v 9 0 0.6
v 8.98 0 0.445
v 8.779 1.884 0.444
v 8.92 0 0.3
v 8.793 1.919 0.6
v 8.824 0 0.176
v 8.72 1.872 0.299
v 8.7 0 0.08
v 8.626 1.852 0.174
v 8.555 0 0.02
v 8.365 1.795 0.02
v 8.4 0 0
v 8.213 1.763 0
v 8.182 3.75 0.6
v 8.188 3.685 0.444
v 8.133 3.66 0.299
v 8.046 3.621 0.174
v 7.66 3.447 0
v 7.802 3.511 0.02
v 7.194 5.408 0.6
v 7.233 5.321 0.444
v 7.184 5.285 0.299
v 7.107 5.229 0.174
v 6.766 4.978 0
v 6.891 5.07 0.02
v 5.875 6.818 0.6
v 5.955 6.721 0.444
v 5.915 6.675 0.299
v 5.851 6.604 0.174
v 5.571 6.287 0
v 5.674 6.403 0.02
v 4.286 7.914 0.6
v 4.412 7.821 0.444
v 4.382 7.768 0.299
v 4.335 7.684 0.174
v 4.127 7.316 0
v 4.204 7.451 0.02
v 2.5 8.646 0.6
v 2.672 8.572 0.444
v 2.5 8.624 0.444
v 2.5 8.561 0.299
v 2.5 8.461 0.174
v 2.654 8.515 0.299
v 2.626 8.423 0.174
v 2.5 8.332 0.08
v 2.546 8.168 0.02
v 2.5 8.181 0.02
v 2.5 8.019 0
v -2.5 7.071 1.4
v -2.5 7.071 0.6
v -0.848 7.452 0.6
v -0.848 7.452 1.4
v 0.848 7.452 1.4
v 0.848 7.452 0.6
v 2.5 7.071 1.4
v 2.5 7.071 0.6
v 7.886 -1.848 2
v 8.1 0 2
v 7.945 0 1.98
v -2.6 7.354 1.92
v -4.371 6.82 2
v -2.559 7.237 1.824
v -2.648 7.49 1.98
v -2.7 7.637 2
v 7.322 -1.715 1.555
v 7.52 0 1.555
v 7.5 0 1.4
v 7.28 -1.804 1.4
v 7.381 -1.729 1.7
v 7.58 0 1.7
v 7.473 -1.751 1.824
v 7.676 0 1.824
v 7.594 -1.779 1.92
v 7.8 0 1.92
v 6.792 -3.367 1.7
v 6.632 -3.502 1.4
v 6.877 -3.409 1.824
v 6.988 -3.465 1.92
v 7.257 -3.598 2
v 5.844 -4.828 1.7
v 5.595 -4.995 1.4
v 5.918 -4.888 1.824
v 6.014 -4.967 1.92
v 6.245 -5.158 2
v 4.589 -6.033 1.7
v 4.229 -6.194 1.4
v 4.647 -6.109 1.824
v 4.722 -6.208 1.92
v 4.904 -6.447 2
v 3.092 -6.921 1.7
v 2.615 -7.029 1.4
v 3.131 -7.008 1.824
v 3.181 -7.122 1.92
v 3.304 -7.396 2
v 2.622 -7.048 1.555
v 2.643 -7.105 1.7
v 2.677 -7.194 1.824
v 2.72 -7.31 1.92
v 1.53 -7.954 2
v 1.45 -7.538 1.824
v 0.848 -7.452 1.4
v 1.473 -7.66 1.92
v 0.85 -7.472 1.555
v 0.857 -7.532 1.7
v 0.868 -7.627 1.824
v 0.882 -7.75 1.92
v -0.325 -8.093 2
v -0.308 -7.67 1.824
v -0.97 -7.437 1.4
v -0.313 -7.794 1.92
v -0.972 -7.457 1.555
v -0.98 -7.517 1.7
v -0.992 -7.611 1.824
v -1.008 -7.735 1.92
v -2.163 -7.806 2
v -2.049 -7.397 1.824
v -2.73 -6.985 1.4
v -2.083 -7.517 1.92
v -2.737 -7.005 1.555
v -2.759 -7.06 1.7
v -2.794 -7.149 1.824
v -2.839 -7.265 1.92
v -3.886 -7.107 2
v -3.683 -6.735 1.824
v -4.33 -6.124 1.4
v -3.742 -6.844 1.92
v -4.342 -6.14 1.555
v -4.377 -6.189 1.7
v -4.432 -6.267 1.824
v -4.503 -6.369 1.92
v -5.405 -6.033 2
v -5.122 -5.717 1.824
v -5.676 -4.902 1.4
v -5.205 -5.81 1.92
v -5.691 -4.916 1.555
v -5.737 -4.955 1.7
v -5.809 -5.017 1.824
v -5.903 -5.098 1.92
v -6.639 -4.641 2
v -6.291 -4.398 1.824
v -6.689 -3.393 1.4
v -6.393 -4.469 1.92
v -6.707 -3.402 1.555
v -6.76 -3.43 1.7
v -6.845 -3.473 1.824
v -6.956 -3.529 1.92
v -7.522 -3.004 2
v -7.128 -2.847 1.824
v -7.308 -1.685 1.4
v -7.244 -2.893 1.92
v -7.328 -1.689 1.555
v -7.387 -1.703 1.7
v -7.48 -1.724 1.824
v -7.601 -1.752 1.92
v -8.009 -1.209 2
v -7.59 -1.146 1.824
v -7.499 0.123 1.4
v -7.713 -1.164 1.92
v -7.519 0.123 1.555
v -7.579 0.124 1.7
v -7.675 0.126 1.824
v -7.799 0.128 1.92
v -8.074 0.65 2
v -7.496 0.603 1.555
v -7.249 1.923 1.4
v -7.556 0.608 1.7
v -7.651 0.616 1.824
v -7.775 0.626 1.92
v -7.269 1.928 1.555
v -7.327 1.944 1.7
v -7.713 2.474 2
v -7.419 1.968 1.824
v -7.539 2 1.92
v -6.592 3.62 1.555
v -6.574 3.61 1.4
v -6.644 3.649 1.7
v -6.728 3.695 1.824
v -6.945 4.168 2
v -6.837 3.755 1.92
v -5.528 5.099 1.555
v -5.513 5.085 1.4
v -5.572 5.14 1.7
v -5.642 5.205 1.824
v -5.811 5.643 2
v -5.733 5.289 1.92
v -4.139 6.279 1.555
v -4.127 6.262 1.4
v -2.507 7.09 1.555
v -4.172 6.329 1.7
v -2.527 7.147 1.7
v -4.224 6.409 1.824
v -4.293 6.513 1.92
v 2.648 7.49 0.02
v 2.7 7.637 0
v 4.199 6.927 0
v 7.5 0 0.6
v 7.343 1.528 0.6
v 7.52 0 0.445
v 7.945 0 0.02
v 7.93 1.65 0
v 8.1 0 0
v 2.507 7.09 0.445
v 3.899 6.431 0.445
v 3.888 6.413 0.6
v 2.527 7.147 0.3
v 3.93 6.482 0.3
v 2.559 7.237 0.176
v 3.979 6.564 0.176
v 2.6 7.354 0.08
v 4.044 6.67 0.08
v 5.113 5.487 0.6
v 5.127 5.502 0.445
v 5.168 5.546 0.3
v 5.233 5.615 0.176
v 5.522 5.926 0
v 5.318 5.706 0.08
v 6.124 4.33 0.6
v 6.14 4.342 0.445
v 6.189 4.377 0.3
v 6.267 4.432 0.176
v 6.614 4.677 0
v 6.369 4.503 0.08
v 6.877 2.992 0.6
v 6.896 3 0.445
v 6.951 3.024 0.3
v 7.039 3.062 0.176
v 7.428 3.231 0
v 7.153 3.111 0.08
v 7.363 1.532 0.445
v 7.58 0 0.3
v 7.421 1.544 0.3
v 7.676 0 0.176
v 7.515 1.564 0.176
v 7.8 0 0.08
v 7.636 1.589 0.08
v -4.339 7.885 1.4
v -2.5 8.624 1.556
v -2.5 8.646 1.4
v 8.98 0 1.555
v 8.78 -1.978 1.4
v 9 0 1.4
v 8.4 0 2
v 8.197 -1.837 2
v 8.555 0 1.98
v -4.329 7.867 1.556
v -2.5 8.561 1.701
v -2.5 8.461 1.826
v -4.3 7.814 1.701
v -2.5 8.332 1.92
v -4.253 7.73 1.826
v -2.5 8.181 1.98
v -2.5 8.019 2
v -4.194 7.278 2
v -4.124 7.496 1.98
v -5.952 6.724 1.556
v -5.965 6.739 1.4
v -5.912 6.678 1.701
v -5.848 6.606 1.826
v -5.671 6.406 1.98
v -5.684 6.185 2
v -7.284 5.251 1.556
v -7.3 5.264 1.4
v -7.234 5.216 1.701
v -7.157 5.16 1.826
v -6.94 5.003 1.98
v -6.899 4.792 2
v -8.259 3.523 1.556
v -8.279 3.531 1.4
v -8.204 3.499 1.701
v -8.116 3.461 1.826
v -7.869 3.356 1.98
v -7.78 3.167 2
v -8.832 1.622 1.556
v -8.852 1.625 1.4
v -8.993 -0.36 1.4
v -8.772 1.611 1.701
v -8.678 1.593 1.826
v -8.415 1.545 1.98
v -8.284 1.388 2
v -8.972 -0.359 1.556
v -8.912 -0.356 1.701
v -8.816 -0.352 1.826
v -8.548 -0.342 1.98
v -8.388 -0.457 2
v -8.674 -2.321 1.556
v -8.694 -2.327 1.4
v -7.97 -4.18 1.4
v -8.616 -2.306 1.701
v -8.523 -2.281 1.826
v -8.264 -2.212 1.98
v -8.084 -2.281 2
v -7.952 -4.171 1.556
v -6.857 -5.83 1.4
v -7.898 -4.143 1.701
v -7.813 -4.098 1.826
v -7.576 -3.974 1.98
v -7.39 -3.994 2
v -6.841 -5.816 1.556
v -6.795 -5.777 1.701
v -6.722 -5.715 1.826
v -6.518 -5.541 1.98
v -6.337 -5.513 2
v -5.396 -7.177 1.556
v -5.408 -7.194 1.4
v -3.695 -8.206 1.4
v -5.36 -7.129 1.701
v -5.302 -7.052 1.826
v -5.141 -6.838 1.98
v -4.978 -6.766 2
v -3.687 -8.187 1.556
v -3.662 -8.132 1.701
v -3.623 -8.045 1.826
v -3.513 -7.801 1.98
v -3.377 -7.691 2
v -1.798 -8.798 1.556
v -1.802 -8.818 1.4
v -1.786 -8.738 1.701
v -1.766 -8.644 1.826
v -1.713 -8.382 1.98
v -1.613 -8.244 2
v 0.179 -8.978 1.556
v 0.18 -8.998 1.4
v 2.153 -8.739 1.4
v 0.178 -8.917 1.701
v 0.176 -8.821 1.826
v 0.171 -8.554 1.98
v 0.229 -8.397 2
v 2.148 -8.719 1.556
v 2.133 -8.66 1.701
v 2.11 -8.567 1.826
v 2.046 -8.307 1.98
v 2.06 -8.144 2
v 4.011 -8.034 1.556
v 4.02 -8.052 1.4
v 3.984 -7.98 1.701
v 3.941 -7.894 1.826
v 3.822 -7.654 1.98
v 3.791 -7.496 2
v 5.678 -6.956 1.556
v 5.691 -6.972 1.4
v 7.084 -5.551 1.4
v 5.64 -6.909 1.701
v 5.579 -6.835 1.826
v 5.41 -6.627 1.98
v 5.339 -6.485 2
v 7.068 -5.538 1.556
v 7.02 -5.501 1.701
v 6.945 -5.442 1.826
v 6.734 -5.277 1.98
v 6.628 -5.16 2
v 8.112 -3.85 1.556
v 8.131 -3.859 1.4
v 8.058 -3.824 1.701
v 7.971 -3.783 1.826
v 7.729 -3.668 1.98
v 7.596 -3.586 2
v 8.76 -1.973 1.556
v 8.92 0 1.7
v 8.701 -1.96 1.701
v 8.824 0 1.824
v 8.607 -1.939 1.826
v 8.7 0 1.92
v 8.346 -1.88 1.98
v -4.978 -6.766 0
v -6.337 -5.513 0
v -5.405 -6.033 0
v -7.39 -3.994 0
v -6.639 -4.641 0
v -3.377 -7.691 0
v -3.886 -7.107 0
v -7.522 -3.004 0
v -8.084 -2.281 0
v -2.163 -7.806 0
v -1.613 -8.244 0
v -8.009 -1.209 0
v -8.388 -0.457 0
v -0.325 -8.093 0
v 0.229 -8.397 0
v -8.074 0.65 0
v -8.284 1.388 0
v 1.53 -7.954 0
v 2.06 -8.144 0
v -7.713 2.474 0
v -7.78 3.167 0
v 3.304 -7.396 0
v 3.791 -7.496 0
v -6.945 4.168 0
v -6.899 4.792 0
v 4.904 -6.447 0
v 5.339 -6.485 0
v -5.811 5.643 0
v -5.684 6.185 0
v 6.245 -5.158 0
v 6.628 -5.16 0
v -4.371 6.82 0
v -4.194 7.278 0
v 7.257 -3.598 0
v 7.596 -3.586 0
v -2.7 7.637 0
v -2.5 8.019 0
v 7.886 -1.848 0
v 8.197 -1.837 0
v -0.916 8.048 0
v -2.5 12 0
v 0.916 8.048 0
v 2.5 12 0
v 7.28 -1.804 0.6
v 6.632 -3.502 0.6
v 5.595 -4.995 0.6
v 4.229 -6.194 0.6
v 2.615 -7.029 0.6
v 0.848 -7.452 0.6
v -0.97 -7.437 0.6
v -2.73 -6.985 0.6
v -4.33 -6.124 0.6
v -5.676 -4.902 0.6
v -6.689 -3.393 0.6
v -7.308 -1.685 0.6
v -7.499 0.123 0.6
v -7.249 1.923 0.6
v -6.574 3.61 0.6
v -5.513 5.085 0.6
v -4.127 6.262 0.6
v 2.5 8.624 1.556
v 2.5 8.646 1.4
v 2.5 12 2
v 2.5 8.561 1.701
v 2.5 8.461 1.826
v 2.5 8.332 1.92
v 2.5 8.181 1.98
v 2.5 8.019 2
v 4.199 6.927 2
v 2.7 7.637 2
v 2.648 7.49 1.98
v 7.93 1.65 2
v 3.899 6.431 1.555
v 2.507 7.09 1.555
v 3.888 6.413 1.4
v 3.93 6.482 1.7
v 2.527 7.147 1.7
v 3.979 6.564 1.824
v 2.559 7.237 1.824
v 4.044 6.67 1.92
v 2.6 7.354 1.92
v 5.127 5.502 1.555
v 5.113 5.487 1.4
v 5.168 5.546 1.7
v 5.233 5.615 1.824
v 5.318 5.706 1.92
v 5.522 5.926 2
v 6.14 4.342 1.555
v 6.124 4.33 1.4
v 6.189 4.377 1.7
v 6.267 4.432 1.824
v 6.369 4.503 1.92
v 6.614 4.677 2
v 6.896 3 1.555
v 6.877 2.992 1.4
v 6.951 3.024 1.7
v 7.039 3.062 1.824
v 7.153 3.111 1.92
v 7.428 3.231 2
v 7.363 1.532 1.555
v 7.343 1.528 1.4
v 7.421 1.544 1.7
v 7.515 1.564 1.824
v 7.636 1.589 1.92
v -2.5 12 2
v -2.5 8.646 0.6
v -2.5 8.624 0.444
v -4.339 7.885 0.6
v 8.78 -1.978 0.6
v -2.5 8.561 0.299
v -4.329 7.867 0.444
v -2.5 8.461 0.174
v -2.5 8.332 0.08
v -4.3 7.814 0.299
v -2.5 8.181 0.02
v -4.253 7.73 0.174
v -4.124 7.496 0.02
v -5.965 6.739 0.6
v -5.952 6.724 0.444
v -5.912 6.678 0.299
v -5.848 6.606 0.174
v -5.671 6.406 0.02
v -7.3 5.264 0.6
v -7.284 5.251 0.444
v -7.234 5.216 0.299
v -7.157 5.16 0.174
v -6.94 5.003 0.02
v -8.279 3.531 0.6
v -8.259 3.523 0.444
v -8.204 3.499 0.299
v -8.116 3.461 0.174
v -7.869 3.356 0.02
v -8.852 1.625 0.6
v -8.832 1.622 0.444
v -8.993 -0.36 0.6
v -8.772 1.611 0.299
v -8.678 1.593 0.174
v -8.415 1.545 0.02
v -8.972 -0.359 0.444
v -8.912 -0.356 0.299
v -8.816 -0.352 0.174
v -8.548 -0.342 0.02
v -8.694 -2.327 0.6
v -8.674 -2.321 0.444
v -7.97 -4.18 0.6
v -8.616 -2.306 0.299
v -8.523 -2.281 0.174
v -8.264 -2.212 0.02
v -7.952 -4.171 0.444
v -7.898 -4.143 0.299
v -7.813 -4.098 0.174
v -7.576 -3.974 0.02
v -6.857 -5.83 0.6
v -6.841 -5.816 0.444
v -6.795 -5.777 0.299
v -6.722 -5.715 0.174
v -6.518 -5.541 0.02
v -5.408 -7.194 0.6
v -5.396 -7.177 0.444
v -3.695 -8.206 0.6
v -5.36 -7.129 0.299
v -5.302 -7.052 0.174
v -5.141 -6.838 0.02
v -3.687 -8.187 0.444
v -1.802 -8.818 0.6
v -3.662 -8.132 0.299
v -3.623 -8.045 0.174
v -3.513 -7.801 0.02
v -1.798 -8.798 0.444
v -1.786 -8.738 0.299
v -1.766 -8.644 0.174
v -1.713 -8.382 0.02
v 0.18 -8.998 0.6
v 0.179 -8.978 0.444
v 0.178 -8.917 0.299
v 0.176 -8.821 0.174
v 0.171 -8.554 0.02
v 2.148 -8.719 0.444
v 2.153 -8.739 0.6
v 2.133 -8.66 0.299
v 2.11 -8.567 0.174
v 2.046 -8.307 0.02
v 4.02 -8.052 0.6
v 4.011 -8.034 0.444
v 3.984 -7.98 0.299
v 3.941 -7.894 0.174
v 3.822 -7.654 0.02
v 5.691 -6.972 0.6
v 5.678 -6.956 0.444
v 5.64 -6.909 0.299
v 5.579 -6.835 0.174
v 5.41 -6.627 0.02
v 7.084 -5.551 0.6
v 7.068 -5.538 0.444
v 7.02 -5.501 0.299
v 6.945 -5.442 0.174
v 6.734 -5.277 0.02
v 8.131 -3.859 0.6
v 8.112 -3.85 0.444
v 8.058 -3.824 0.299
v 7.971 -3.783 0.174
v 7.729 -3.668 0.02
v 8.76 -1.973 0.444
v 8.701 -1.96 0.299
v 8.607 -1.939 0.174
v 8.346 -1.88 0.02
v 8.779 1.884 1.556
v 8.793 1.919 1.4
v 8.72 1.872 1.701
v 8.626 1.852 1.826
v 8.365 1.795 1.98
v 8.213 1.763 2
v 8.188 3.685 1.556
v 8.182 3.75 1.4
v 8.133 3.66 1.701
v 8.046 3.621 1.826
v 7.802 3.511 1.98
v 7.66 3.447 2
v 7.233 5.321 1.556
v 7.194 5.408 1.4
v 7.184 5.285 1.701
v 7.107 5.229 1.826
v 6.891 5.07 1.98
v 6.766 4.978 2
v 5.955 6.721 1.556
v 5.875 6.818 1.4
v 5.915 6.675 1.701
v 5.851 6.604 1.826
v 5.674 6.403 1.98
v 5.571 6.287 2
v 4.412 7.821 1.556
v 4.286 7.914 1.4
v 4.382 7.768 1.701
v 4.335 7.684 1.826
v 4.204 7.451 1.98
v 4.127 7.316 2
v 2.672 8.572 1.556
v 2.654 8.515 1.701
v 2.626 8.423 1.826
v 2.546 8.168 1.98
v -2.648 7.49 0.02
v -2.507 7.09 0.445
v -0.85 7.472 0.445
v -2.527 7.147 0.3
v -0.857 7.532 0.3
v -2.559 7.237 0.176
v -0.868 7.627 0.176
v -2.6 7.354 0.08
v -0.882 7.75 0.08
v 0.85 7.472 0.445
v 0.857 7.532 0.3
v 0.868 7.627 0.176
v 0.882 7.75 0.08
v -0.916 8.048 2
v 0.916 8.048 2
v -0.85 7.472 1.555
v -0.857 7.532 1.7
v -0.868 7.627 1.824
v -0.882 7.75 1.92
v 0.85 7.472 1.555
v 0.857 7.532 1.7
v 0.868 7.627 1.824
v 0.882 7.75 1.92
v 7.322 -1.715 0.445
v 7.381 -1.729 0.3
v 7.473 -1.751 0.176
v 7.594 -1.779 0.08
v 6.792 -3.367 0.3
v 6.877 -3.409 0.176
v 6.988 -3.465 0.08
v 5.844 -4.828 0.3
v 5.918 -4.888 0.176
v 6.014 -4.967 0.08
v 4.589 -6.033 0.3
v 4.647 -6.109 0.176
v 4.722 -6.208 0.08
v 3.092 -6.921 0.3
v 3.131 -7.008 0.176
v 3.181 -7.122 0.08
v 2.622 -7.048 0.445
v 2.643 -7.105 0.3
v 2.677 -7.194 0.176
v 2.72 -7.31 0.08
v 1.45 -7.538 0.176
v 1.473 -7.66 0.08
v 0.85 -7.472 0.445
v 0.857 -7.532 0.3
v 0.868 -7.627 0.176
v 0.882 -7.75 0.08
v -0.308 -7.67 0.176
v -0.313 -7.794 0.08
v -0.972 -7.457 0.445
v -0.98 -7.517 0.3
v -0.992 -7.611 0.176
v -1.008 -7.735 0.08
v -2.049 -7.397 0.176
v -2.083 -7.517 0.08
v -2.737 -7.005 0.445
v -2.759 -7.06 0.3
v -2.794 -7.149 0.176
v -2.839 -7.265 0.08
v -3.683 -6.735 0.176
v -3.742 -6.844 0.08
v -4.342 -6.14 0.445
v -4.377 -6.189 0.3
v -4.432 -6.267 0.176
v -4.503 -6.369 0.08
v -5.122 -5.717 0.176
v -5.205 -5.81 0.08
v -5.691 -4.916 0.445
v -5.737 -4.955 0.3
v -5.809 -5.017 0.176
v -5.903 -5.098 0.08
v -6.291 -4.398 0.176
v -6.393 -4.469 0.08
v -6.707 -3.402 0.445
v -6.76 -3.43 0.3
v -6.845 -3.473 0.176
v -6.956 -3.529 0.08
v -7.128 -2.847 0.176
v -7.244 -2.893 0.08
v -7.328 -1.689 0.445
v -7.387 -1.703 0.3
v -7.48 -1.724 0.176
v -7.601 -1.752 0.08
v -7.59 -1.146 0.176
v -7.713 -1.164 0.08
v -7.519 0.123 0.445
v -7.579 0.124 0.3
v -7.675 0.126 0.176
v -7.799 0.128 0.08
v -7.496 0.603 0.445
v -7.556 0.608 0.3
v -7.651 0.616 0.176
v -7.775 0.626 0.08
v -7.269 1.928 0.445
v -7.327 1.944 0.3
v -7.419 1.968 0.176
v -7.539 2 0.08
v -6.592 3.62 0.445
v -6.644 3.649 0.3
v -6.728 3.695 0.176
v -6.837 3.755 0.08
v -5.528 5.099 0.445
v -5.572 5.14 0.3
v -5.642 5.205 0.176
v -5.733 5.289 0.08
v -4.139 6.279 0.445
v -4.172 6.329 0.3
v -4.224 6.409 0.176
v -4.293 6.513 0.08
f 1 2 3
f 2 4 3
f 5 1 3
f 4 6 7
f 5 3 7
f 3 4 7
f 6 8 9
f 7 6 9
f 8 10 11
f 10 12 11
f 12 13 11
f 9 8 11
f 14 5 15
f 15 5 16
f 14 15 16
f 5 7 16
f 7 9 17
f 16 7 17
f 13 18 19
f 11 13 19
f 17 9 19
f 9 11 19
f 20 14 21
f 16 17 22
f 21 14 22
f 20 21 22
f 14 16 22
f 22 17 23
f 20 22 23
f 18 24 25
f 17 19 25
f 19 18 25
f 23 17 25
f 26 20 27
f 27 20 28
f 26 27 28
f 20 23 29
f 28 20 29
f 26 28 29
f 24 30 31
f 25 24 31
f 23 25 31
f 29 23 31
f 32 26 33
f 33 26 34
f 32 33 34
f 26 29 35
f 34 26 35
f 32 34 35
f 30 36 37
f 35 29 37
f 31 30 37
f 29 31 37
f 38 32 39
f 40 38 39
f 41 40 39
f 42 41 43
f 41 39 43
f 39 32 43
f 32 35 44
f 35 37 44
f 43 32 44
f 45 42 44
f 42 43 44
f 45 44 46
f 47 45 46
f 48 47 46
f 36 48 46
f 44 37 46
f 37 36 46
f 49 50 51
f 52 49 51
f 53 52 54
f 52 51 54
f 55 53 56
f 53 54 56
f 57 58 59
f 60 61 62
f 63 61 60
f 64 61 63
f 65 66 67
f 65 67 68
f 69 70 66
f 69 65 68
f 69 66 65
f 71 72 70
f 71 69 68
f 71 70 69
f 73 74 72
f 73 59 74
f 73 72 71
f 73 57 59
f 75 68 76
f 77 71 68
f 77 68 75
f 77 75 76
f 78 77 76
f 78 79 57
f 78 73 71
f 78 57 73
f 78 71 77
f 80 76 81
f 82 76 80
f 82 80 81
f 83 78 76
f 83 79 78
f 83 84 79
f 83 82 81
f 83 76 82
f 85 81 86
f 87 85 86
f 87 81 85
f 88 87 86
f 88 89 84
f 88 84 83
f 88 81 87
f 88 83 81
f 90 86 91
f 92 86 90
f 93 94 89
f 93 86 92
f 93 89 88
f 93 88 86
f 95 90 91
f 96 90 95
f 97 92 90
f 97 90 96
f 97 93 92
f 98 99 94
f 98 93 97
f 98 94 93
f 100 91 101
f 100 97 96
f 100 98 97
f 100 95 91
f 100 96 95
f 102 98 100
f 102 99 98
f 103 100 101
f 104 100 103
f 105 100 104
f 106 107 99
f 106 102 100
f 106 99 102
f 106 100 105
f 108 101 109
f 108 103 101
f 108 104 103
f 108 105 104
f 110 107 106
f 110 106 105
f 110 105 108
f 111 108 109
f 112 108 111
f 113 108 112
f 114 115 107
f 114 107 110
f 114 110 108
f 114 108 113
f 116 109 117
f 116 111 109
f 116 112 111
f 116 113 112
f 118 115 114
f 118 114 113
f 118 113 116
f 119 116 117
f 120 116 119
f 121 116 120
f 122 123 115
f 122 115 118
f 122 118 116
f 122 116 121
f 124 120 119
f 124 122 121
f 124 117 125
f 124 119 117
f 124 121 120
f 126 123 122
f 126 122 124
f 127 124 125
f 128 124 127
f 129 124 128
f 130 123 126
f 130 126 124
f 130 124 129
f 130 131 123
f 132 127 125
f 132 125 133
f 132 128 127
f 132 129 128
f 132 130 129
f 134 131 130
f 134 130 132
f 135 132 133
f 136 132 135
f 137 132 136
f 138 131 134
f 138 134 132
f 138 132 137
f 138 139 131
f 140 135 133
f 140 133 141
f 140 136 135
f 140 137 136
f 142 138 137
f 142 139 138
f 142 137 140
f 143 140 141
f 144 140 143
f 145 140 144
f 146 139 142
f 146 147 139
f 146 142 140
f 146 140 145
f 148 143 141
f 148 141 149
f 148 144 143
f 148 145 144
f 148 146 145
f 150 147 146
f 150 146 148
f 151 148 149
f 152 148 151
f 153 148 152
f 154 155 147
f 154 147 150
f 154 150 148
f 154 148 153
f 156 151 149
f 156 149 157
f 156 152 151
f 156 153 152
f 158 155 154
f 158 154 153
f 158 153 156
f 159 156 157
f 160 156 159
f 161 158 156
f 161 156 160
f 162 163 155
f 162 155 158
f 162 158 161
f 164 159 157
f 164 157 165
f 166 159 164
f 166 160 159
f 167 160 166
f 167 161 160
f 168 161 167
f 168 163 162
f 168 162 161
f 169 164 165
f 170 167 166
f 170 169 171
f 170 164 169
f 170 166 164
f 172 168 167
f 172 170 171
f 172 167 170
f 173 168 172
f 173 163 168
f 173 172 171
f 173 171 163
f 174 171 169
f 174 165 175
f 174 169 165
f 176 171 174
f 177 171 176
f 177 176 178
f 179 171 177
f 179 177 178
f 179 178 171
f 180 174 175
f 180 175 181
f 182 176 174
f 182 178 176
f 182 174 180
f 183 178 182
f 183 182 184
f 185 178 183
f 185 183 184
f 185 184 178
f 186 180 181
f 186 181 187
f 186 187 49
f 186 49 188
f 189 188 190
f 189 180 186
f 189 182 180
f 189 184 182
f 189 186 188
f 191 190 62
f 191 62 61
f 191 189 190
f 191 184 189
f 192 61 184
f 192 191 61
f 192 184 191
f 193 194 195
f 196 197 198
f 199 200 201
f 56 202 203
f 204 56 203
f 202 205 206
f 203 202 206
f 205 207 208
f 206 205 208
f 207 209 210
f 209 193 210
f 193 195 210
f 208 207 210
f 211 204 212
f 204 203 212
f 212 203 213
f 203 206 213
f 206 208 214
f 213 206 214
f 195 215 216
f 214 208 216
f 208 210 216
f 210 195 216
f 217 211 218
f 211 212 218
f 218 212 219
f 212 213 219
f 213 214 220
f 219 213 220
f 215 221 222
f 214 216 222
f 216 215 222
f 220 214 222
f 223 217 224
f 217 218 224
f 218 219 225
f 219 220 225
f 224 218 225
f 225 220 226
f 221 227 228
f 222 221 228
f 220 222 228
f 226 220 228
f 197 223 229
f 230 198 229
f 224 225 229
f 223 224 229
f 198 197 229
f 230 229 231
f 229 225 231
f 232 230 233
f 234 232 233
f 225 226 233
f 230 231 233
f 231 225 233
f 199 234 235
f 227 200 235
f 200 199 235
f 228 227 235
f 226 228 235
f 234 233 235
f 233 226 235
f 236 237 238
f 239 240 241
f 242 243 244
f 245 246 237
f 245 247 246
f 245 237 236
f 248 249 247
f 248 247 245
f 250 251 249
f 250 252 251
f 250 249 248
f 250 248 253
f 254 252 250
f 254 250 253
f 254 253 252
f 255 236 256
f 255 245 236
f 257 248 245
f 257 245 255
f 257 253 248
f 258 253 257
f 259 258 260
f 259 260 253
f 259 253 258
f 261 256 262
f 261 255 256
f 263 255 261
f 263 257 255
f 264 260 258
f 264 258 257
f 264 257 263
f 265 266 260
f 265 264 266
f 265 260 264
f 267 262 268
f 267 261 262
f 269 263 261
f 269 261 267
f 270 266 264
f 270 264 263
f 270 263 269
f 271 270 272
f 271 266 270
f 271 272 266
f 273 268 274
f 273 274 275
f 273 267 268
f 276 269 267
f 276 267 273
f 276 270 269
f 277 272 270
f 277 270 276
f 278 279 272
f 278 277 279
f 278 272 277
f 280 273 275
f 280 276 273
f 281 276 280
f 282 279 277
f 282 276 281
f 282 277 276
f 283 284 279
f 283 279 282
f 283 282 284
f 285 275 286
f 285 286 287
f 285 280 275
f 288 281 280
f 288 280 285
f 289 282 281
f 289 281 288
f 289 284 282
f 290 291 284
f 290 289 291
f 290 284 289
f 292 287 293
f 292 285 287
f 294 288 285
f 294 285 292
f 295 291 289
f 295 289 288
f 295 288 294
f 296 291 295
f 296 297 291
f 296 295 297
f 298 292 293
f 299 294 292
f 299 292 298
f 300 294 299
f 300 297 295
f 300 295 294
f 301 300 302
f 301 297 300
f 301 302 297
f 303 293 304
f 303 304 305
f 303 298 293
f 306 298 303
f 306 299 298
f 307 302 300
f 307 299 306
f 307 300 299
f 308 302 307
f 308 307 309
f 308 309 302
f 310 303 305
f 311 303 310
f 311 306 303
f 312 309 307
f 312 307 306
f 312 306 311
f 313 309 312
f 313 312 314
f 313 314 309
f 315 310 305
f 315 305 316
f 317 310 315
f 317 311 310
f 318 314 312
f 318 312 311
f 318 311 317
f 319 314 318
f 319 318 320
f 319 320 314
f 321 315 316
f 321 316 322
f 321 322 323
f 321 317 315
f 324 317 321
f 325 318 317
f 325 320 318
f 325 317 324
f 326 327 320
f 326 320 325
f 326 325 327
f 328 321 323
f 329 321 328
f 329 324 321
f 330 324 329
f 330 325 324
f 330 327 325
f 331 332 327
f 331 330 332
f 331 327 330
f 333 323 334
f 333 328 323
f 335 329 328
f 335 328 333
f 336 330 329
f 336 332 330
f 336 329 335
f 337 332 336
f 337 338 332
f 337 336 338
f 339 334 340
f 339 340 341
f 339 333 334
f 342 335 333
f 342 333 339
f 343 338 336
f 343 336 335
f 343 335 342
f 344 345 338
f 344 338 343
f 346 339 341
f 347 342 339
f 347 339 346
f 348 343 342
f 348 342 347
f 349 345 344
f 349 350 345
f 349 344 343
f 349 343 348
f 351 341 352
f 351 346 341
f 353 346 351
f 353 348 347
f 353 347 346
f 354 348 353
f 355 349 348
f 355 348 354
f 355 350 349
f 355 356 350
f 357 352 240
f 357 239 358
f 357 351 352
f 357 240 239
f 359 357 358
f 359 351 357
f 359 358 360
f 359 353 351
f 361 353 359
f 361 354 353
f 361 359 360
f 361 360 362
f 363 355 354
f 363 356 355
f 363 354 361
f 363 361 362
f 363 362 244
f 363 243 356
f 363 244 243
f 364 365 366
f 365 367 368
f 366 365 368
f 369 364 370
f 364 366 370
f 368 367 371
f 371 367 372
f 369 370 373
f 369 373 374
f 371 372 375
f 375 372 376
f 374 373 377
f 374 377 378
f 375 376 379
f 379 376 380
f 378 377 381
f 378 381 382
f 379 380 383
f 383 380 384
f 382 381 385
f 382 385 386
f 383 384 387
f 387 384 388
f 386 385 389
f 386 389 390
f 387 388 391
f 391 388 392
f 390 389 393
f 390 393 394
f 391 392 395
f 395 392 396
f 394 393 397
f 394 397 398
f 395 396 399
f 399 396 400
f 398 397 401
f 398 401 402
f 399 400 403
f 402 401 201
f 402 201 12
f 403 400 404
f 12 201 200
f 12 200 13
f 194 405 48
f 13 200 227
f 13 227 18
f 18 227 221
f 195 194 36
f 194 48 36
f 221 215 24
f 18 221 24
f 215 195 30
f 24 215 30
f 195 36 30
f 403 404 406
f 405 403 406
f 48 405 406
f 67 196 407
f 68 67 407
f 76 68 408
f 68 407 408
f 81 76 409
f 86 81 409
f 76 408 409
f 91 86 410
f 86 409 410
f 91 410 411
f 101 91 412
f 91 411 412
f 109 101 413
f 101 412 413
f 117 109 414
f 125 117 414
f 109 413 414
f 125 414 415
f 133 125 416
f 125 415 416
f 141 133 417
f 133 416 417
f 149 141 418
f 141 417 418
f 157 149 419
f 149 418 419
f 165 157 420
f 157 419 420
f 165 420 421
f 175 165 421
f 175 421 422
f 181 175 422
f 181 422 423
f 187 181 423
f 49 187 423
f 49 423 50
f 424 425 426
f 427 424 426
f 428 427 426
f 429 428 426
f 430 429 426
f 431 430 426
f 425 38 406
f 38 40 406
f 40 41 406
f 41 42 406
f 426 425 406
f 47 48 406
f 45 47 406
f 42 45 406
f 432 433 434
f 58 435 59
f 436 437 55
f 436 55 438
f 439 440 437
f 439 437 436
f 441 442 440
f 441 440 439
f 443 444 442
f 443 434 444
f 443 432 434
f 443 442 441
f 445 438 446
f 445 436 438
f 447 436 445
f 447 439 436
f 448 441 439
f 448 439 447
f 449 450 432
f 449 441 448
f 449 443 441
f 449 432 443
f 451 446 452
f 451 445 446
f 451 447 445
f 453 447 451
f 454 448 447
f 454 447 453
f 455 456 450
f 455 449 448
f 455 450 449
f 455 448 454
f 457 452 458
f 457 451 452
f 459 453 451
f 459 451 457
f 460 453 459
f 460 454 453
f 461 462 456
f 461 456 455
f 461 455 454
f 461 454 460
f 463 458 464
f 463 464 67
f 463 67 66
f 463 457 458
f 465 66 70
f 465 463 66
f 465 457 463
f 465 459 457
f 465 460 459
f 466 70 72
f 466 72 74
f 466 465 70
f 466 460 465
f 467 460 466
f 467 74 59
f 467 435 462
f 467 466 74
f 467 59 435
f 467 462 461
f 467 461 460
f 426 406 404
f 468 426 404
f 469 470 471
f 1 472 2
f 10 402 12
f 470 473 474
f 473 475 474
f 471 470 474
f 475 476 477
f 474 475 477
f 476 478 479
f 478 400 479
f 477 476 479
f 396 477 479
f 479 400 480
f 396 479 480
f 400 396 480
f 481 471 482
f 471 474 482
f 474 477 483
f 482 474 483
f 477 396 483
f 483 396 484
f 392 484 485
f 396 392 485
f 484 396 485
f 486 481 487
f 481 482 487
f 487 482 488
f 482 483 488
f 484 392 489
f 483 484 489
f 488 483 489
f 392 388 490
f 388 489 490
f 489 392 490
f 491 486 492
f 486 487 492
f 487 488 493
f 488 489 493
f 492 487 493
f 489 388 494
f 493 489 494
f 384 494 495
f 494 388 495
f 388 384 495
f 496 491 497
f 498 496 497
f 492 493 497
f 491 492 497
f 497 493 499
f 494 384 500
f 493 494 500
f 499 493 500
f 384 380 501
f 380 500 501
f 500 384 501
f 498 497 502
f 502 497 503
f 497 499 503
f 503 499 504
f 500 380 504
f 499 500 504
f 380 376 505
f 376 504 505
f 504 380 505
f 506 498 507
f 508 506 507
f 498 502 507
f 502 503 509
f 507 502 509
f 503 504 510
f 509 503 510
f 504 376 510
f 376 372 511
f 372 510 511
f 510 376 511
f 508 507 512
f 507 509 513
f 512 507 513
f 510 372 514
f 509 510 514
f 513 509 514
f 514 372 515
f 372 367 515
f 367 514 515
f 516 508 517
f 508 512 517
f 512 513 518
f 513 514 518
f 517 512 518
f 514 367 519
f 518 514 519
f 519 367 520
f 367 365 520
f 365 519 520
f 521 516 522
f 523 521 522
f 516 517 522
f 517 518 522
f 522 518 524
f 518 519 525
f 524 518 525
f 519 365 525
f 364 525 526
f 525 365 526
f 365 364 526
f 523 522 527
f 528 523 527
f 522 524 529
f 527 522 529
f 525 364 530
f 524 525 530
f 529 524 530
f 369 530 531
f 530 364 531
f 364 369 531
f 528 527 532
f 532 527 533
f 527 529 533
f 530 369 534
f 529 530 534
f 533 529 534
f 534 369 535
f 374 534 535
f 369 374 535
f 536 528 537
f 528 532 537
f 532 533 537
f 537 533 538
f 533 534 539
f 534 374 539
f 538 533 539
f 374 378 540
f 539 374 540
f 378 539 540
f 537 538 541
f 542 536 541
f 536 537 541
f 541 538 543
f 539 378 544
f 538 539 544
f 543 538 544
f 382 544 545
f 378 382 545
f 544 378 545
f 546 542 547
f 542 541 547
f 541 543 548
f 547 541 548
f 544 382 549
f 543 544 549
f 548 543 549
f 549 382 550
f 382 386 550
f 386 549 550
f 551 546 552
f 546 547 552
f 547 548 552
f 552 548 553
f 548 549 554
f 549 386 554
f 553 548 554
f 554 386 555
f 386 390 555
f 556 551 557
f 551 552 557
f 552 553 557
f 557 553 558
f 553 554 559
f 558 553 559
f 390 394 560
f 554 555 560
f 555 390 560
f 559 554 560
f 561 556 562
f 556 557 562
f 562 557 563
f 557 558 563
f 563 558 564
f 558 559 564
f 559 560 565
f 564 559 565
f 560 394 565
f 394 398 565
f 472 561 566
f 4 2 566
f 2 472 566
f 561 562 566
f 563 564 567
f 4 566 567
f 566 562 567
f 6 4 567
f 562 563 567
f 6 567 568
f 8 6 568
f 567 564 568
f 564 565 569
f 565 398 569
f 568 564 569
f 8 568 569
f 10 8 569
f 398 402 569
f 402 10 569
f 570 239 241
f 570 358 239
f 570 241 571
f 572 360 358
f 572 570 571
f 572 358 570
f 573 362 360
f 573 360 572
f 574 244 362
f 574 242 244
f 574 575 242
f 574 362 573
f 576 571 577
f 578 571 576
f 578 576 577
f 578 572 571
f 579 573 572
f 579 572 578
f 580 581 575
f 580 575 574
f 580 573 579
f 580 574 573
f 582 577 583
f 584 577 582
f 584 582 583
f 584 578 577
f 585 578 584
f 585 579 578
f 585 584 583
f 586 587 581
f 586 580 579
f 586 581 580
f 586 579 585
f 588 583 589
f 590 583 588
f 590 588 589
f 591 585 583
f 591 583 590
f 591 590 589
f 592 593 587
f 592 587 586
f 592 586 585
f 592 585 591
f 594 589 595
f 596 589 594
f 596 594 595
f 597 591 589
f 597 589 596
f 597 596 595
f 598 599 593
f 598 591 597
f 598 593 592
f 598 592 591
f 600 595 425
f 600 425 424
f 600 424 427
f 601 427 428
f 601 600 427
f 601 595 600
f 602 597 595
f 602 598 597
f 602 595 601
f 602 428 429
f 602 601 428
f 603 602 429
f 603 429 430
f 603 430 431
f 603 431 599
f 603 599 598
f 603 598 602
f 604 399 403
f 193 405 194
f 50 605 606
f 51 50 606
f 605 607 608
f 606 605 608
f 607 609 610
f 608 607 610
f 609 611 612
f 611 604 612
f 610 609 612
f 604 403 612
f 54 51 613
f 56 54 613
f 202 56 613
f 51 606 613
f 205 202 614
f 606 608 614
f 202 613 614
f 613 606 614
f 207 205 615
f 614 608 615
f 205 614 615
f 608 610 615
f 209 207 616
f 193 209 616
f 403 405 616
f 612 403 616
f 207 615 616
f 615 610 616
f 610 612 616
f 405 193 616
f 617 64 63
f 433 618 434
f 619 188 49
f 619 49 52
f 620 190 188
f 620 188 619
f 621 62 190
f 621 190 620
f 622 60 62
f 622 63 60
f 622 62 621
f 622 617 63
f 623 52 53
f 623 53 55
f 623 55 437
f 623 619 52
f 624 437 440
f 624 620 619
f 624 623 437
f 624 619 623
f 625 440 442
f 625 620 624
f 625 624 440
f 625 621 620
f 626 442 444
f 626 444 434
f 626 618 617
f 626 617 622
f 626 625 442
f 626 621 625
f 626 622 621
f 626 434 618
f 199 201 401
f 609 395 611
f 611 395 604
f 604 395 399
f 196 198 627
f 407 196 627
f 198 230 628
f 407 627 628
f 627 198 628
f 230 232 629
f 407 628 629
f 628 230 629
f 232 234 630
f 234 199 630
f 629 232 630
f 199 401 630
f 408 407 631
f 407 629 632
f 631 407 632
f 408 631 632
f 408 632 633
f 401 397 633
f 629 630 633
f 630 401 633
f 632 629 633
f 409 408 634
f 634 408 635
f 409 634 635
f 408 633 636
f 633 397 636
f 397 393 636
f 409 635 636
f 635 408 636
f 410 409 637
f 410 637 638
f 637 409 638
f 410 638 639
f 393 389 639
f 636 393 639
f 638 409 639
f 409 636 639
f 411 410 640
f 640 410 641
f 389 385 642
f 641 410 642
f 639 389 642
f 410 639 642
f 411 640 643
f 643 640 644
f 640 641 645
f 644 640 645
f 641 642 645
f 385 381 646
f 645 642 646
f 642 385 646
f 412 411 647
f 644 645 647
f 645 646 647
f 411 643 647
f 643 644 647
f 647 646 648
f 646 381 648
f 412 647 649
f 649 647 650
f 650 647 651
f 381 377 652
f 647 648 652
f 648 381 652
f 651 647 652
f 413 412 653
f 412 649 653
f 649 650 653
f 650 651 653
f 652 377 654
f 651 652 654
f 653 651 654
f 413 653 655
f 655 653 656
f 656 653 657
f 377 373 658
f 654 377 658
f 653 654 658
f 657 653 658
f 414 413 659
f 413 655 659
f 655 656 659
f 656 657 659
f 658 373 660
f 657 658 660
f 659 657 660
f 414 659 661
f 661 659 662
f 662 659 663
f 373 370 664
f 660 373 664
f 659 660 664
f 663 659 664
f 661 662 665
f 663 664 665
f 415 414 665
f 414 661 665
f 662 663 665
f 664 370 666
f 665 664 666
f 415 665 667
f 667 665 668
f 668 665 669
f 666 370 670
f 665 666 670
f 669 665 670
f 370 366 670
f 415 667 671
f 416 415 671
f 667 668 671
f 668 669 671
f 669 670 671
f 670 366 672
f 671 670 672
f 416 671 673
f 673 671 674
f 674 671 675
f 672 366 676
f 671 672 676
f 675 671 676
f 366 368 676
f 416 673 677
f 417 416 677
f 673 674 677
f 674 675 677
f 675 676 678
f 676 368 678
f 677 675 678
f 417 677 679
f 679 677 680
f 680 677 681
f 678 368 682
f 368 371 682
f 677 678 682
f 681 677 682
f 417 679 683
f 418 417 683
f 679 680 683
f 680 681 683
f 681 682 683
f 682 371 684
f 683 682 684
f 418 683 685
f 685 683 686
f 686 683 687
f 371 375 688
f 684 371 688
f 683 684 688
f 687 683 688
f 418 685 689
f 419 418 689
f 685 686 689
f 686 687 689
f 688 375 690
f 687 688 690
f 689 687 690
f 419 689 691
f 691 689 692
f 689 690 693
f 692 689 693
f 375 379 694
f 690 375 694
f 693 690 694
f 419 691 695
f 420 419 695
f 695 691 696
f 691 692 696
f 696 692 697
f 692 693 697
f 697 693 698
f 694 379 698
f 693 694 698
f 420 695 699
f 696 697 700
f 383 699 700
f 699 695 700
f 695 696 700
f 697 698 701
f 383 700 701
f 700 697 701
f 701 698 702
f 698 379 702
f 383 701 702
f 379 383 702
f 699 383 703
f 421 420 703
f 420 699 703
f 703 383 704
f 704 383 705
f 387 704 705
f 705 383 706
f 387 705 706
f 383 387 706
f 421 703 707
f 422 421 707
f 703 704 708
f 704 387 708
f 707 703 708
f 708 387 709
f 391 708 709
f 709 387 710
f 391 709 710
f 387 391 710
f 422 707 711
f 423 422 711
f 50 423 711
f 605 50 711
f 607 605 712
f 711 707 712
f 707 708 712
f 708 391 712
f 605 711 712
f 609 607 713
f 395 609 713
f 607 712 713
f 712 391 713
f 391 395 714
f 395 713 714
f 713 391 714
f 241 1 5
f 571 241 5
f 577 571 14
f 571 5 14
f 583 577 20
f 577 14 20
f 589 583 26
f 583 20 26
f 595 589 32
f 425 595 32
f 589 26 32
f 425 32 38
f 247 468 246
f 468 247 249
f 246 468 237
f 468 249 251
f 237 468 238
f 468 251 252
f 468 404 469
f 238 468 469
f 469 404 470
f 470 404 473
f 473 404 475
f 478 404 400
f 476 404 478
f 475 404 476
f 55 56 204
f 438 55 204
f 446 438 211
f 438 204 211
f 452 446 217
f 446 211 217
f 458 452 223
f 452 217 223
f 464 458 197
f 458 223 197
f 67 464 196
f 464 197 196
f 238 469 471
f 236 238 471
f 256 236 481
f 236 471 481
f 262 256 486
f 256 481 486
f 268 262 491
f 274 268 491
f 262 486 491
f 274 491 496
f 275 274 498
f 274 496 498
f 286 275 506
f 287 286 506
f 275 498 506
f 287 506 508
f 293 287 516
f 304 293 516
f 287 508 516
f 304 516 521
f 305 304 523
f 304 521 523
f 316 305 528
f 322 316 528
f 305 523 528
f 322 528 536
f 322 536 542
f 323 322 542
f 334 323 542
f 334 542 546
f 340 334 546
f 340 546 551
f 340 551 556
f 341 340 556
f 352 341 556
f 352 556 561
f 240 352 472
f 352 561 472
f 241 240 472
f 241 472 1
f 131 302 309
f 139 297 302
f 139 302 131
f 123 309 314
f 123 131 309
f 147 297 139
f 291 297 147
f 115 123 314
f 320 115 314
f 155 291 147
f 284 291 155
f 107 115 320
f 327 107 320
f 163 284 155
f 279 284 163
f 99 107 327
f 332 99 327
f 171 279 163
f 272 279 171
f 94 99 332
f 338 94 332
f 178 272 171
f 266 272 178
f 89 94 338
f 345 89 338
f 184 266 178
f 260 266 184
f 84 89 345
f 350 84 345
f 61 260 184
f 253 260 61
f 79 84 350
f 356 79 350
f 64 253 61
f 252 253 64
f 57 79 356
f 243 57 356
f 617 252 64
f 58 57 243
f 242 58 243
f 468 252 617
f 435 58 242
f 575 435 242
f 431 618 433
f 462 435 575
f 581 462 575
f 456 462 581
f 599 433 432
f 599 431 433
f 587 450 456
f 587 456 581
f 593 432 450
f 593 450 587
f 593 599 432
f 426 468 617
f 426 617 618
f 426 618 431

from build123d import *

# Parameters (mm, degrees)
F1_DEPTH = 2
F2_R     = 0.6


# Not quite as in the source:
# - a feature names something its author has since deleted; it is built from what else it names


with BuildPart() as f1:
    # F0 (on Top) → F1 (new body)
    with BuildSketch(Plane.XY):
        with BuildLine():
            ThreePointArc((2.5, 7.0710678119), (6.123724357, 4.3301270189), (7.5, 0))
            ThreePointArc((7.5, 0), (-4.3301270189, -6.123724357), (-2.5, 7.0710678119))
            Line((-2.5, 7.0710678119), (-2.5, 8.6458082329))
            ThreePointArc((-2.5, 8.6458082329), (-5.4083269132, -7.193747285), (9, 0))
            ThreePointArc((9, 0), (7.193747285, 5.4083269132), (2.5, 8.6458082329))
            Line((2.5, 8.6458082329), (2.5, 7.0710678119))
        make_face()
        with BuildLine():
            ThreePointArc((-2.5, 7.0710678119), (0, 7.5), (2.5, 7.0710678119))
            Line((2.5, 7.0710678119), (2.5, 8.6458082329))
            ThreePointArc((2.5, 8.6458082329), (0, 9), (-2.5, 8.6458082329))
            Line((-2.5, 8.6458082329), (-2.5, 7.0710678119))
        make_face()
        with BuildLine():
            ThreePointArc((-2.5, 8.6458082329), (0, 9), (2.5, 8.6458082329))
            Line((2.5, 8.6458082329), (2.5, 12))
            Line((2.5, 12), (-2.5, 12))
            Line((-2.5, 12), (-2.5, 8.6458082329))
        make_face()
    extrude(amount=F1_DEPTH)

    # F2
    f2_edges = [f1.edges().sort_by_distance(p)[0] for p in [
        (0, -9, 0),
        (0, -9, 2),
        (-7.5, 0, 2),
        (-7.5, 0, 0),
    ]]
    fillet(f2_edges, radius=F2_R)


solid = f1.part
